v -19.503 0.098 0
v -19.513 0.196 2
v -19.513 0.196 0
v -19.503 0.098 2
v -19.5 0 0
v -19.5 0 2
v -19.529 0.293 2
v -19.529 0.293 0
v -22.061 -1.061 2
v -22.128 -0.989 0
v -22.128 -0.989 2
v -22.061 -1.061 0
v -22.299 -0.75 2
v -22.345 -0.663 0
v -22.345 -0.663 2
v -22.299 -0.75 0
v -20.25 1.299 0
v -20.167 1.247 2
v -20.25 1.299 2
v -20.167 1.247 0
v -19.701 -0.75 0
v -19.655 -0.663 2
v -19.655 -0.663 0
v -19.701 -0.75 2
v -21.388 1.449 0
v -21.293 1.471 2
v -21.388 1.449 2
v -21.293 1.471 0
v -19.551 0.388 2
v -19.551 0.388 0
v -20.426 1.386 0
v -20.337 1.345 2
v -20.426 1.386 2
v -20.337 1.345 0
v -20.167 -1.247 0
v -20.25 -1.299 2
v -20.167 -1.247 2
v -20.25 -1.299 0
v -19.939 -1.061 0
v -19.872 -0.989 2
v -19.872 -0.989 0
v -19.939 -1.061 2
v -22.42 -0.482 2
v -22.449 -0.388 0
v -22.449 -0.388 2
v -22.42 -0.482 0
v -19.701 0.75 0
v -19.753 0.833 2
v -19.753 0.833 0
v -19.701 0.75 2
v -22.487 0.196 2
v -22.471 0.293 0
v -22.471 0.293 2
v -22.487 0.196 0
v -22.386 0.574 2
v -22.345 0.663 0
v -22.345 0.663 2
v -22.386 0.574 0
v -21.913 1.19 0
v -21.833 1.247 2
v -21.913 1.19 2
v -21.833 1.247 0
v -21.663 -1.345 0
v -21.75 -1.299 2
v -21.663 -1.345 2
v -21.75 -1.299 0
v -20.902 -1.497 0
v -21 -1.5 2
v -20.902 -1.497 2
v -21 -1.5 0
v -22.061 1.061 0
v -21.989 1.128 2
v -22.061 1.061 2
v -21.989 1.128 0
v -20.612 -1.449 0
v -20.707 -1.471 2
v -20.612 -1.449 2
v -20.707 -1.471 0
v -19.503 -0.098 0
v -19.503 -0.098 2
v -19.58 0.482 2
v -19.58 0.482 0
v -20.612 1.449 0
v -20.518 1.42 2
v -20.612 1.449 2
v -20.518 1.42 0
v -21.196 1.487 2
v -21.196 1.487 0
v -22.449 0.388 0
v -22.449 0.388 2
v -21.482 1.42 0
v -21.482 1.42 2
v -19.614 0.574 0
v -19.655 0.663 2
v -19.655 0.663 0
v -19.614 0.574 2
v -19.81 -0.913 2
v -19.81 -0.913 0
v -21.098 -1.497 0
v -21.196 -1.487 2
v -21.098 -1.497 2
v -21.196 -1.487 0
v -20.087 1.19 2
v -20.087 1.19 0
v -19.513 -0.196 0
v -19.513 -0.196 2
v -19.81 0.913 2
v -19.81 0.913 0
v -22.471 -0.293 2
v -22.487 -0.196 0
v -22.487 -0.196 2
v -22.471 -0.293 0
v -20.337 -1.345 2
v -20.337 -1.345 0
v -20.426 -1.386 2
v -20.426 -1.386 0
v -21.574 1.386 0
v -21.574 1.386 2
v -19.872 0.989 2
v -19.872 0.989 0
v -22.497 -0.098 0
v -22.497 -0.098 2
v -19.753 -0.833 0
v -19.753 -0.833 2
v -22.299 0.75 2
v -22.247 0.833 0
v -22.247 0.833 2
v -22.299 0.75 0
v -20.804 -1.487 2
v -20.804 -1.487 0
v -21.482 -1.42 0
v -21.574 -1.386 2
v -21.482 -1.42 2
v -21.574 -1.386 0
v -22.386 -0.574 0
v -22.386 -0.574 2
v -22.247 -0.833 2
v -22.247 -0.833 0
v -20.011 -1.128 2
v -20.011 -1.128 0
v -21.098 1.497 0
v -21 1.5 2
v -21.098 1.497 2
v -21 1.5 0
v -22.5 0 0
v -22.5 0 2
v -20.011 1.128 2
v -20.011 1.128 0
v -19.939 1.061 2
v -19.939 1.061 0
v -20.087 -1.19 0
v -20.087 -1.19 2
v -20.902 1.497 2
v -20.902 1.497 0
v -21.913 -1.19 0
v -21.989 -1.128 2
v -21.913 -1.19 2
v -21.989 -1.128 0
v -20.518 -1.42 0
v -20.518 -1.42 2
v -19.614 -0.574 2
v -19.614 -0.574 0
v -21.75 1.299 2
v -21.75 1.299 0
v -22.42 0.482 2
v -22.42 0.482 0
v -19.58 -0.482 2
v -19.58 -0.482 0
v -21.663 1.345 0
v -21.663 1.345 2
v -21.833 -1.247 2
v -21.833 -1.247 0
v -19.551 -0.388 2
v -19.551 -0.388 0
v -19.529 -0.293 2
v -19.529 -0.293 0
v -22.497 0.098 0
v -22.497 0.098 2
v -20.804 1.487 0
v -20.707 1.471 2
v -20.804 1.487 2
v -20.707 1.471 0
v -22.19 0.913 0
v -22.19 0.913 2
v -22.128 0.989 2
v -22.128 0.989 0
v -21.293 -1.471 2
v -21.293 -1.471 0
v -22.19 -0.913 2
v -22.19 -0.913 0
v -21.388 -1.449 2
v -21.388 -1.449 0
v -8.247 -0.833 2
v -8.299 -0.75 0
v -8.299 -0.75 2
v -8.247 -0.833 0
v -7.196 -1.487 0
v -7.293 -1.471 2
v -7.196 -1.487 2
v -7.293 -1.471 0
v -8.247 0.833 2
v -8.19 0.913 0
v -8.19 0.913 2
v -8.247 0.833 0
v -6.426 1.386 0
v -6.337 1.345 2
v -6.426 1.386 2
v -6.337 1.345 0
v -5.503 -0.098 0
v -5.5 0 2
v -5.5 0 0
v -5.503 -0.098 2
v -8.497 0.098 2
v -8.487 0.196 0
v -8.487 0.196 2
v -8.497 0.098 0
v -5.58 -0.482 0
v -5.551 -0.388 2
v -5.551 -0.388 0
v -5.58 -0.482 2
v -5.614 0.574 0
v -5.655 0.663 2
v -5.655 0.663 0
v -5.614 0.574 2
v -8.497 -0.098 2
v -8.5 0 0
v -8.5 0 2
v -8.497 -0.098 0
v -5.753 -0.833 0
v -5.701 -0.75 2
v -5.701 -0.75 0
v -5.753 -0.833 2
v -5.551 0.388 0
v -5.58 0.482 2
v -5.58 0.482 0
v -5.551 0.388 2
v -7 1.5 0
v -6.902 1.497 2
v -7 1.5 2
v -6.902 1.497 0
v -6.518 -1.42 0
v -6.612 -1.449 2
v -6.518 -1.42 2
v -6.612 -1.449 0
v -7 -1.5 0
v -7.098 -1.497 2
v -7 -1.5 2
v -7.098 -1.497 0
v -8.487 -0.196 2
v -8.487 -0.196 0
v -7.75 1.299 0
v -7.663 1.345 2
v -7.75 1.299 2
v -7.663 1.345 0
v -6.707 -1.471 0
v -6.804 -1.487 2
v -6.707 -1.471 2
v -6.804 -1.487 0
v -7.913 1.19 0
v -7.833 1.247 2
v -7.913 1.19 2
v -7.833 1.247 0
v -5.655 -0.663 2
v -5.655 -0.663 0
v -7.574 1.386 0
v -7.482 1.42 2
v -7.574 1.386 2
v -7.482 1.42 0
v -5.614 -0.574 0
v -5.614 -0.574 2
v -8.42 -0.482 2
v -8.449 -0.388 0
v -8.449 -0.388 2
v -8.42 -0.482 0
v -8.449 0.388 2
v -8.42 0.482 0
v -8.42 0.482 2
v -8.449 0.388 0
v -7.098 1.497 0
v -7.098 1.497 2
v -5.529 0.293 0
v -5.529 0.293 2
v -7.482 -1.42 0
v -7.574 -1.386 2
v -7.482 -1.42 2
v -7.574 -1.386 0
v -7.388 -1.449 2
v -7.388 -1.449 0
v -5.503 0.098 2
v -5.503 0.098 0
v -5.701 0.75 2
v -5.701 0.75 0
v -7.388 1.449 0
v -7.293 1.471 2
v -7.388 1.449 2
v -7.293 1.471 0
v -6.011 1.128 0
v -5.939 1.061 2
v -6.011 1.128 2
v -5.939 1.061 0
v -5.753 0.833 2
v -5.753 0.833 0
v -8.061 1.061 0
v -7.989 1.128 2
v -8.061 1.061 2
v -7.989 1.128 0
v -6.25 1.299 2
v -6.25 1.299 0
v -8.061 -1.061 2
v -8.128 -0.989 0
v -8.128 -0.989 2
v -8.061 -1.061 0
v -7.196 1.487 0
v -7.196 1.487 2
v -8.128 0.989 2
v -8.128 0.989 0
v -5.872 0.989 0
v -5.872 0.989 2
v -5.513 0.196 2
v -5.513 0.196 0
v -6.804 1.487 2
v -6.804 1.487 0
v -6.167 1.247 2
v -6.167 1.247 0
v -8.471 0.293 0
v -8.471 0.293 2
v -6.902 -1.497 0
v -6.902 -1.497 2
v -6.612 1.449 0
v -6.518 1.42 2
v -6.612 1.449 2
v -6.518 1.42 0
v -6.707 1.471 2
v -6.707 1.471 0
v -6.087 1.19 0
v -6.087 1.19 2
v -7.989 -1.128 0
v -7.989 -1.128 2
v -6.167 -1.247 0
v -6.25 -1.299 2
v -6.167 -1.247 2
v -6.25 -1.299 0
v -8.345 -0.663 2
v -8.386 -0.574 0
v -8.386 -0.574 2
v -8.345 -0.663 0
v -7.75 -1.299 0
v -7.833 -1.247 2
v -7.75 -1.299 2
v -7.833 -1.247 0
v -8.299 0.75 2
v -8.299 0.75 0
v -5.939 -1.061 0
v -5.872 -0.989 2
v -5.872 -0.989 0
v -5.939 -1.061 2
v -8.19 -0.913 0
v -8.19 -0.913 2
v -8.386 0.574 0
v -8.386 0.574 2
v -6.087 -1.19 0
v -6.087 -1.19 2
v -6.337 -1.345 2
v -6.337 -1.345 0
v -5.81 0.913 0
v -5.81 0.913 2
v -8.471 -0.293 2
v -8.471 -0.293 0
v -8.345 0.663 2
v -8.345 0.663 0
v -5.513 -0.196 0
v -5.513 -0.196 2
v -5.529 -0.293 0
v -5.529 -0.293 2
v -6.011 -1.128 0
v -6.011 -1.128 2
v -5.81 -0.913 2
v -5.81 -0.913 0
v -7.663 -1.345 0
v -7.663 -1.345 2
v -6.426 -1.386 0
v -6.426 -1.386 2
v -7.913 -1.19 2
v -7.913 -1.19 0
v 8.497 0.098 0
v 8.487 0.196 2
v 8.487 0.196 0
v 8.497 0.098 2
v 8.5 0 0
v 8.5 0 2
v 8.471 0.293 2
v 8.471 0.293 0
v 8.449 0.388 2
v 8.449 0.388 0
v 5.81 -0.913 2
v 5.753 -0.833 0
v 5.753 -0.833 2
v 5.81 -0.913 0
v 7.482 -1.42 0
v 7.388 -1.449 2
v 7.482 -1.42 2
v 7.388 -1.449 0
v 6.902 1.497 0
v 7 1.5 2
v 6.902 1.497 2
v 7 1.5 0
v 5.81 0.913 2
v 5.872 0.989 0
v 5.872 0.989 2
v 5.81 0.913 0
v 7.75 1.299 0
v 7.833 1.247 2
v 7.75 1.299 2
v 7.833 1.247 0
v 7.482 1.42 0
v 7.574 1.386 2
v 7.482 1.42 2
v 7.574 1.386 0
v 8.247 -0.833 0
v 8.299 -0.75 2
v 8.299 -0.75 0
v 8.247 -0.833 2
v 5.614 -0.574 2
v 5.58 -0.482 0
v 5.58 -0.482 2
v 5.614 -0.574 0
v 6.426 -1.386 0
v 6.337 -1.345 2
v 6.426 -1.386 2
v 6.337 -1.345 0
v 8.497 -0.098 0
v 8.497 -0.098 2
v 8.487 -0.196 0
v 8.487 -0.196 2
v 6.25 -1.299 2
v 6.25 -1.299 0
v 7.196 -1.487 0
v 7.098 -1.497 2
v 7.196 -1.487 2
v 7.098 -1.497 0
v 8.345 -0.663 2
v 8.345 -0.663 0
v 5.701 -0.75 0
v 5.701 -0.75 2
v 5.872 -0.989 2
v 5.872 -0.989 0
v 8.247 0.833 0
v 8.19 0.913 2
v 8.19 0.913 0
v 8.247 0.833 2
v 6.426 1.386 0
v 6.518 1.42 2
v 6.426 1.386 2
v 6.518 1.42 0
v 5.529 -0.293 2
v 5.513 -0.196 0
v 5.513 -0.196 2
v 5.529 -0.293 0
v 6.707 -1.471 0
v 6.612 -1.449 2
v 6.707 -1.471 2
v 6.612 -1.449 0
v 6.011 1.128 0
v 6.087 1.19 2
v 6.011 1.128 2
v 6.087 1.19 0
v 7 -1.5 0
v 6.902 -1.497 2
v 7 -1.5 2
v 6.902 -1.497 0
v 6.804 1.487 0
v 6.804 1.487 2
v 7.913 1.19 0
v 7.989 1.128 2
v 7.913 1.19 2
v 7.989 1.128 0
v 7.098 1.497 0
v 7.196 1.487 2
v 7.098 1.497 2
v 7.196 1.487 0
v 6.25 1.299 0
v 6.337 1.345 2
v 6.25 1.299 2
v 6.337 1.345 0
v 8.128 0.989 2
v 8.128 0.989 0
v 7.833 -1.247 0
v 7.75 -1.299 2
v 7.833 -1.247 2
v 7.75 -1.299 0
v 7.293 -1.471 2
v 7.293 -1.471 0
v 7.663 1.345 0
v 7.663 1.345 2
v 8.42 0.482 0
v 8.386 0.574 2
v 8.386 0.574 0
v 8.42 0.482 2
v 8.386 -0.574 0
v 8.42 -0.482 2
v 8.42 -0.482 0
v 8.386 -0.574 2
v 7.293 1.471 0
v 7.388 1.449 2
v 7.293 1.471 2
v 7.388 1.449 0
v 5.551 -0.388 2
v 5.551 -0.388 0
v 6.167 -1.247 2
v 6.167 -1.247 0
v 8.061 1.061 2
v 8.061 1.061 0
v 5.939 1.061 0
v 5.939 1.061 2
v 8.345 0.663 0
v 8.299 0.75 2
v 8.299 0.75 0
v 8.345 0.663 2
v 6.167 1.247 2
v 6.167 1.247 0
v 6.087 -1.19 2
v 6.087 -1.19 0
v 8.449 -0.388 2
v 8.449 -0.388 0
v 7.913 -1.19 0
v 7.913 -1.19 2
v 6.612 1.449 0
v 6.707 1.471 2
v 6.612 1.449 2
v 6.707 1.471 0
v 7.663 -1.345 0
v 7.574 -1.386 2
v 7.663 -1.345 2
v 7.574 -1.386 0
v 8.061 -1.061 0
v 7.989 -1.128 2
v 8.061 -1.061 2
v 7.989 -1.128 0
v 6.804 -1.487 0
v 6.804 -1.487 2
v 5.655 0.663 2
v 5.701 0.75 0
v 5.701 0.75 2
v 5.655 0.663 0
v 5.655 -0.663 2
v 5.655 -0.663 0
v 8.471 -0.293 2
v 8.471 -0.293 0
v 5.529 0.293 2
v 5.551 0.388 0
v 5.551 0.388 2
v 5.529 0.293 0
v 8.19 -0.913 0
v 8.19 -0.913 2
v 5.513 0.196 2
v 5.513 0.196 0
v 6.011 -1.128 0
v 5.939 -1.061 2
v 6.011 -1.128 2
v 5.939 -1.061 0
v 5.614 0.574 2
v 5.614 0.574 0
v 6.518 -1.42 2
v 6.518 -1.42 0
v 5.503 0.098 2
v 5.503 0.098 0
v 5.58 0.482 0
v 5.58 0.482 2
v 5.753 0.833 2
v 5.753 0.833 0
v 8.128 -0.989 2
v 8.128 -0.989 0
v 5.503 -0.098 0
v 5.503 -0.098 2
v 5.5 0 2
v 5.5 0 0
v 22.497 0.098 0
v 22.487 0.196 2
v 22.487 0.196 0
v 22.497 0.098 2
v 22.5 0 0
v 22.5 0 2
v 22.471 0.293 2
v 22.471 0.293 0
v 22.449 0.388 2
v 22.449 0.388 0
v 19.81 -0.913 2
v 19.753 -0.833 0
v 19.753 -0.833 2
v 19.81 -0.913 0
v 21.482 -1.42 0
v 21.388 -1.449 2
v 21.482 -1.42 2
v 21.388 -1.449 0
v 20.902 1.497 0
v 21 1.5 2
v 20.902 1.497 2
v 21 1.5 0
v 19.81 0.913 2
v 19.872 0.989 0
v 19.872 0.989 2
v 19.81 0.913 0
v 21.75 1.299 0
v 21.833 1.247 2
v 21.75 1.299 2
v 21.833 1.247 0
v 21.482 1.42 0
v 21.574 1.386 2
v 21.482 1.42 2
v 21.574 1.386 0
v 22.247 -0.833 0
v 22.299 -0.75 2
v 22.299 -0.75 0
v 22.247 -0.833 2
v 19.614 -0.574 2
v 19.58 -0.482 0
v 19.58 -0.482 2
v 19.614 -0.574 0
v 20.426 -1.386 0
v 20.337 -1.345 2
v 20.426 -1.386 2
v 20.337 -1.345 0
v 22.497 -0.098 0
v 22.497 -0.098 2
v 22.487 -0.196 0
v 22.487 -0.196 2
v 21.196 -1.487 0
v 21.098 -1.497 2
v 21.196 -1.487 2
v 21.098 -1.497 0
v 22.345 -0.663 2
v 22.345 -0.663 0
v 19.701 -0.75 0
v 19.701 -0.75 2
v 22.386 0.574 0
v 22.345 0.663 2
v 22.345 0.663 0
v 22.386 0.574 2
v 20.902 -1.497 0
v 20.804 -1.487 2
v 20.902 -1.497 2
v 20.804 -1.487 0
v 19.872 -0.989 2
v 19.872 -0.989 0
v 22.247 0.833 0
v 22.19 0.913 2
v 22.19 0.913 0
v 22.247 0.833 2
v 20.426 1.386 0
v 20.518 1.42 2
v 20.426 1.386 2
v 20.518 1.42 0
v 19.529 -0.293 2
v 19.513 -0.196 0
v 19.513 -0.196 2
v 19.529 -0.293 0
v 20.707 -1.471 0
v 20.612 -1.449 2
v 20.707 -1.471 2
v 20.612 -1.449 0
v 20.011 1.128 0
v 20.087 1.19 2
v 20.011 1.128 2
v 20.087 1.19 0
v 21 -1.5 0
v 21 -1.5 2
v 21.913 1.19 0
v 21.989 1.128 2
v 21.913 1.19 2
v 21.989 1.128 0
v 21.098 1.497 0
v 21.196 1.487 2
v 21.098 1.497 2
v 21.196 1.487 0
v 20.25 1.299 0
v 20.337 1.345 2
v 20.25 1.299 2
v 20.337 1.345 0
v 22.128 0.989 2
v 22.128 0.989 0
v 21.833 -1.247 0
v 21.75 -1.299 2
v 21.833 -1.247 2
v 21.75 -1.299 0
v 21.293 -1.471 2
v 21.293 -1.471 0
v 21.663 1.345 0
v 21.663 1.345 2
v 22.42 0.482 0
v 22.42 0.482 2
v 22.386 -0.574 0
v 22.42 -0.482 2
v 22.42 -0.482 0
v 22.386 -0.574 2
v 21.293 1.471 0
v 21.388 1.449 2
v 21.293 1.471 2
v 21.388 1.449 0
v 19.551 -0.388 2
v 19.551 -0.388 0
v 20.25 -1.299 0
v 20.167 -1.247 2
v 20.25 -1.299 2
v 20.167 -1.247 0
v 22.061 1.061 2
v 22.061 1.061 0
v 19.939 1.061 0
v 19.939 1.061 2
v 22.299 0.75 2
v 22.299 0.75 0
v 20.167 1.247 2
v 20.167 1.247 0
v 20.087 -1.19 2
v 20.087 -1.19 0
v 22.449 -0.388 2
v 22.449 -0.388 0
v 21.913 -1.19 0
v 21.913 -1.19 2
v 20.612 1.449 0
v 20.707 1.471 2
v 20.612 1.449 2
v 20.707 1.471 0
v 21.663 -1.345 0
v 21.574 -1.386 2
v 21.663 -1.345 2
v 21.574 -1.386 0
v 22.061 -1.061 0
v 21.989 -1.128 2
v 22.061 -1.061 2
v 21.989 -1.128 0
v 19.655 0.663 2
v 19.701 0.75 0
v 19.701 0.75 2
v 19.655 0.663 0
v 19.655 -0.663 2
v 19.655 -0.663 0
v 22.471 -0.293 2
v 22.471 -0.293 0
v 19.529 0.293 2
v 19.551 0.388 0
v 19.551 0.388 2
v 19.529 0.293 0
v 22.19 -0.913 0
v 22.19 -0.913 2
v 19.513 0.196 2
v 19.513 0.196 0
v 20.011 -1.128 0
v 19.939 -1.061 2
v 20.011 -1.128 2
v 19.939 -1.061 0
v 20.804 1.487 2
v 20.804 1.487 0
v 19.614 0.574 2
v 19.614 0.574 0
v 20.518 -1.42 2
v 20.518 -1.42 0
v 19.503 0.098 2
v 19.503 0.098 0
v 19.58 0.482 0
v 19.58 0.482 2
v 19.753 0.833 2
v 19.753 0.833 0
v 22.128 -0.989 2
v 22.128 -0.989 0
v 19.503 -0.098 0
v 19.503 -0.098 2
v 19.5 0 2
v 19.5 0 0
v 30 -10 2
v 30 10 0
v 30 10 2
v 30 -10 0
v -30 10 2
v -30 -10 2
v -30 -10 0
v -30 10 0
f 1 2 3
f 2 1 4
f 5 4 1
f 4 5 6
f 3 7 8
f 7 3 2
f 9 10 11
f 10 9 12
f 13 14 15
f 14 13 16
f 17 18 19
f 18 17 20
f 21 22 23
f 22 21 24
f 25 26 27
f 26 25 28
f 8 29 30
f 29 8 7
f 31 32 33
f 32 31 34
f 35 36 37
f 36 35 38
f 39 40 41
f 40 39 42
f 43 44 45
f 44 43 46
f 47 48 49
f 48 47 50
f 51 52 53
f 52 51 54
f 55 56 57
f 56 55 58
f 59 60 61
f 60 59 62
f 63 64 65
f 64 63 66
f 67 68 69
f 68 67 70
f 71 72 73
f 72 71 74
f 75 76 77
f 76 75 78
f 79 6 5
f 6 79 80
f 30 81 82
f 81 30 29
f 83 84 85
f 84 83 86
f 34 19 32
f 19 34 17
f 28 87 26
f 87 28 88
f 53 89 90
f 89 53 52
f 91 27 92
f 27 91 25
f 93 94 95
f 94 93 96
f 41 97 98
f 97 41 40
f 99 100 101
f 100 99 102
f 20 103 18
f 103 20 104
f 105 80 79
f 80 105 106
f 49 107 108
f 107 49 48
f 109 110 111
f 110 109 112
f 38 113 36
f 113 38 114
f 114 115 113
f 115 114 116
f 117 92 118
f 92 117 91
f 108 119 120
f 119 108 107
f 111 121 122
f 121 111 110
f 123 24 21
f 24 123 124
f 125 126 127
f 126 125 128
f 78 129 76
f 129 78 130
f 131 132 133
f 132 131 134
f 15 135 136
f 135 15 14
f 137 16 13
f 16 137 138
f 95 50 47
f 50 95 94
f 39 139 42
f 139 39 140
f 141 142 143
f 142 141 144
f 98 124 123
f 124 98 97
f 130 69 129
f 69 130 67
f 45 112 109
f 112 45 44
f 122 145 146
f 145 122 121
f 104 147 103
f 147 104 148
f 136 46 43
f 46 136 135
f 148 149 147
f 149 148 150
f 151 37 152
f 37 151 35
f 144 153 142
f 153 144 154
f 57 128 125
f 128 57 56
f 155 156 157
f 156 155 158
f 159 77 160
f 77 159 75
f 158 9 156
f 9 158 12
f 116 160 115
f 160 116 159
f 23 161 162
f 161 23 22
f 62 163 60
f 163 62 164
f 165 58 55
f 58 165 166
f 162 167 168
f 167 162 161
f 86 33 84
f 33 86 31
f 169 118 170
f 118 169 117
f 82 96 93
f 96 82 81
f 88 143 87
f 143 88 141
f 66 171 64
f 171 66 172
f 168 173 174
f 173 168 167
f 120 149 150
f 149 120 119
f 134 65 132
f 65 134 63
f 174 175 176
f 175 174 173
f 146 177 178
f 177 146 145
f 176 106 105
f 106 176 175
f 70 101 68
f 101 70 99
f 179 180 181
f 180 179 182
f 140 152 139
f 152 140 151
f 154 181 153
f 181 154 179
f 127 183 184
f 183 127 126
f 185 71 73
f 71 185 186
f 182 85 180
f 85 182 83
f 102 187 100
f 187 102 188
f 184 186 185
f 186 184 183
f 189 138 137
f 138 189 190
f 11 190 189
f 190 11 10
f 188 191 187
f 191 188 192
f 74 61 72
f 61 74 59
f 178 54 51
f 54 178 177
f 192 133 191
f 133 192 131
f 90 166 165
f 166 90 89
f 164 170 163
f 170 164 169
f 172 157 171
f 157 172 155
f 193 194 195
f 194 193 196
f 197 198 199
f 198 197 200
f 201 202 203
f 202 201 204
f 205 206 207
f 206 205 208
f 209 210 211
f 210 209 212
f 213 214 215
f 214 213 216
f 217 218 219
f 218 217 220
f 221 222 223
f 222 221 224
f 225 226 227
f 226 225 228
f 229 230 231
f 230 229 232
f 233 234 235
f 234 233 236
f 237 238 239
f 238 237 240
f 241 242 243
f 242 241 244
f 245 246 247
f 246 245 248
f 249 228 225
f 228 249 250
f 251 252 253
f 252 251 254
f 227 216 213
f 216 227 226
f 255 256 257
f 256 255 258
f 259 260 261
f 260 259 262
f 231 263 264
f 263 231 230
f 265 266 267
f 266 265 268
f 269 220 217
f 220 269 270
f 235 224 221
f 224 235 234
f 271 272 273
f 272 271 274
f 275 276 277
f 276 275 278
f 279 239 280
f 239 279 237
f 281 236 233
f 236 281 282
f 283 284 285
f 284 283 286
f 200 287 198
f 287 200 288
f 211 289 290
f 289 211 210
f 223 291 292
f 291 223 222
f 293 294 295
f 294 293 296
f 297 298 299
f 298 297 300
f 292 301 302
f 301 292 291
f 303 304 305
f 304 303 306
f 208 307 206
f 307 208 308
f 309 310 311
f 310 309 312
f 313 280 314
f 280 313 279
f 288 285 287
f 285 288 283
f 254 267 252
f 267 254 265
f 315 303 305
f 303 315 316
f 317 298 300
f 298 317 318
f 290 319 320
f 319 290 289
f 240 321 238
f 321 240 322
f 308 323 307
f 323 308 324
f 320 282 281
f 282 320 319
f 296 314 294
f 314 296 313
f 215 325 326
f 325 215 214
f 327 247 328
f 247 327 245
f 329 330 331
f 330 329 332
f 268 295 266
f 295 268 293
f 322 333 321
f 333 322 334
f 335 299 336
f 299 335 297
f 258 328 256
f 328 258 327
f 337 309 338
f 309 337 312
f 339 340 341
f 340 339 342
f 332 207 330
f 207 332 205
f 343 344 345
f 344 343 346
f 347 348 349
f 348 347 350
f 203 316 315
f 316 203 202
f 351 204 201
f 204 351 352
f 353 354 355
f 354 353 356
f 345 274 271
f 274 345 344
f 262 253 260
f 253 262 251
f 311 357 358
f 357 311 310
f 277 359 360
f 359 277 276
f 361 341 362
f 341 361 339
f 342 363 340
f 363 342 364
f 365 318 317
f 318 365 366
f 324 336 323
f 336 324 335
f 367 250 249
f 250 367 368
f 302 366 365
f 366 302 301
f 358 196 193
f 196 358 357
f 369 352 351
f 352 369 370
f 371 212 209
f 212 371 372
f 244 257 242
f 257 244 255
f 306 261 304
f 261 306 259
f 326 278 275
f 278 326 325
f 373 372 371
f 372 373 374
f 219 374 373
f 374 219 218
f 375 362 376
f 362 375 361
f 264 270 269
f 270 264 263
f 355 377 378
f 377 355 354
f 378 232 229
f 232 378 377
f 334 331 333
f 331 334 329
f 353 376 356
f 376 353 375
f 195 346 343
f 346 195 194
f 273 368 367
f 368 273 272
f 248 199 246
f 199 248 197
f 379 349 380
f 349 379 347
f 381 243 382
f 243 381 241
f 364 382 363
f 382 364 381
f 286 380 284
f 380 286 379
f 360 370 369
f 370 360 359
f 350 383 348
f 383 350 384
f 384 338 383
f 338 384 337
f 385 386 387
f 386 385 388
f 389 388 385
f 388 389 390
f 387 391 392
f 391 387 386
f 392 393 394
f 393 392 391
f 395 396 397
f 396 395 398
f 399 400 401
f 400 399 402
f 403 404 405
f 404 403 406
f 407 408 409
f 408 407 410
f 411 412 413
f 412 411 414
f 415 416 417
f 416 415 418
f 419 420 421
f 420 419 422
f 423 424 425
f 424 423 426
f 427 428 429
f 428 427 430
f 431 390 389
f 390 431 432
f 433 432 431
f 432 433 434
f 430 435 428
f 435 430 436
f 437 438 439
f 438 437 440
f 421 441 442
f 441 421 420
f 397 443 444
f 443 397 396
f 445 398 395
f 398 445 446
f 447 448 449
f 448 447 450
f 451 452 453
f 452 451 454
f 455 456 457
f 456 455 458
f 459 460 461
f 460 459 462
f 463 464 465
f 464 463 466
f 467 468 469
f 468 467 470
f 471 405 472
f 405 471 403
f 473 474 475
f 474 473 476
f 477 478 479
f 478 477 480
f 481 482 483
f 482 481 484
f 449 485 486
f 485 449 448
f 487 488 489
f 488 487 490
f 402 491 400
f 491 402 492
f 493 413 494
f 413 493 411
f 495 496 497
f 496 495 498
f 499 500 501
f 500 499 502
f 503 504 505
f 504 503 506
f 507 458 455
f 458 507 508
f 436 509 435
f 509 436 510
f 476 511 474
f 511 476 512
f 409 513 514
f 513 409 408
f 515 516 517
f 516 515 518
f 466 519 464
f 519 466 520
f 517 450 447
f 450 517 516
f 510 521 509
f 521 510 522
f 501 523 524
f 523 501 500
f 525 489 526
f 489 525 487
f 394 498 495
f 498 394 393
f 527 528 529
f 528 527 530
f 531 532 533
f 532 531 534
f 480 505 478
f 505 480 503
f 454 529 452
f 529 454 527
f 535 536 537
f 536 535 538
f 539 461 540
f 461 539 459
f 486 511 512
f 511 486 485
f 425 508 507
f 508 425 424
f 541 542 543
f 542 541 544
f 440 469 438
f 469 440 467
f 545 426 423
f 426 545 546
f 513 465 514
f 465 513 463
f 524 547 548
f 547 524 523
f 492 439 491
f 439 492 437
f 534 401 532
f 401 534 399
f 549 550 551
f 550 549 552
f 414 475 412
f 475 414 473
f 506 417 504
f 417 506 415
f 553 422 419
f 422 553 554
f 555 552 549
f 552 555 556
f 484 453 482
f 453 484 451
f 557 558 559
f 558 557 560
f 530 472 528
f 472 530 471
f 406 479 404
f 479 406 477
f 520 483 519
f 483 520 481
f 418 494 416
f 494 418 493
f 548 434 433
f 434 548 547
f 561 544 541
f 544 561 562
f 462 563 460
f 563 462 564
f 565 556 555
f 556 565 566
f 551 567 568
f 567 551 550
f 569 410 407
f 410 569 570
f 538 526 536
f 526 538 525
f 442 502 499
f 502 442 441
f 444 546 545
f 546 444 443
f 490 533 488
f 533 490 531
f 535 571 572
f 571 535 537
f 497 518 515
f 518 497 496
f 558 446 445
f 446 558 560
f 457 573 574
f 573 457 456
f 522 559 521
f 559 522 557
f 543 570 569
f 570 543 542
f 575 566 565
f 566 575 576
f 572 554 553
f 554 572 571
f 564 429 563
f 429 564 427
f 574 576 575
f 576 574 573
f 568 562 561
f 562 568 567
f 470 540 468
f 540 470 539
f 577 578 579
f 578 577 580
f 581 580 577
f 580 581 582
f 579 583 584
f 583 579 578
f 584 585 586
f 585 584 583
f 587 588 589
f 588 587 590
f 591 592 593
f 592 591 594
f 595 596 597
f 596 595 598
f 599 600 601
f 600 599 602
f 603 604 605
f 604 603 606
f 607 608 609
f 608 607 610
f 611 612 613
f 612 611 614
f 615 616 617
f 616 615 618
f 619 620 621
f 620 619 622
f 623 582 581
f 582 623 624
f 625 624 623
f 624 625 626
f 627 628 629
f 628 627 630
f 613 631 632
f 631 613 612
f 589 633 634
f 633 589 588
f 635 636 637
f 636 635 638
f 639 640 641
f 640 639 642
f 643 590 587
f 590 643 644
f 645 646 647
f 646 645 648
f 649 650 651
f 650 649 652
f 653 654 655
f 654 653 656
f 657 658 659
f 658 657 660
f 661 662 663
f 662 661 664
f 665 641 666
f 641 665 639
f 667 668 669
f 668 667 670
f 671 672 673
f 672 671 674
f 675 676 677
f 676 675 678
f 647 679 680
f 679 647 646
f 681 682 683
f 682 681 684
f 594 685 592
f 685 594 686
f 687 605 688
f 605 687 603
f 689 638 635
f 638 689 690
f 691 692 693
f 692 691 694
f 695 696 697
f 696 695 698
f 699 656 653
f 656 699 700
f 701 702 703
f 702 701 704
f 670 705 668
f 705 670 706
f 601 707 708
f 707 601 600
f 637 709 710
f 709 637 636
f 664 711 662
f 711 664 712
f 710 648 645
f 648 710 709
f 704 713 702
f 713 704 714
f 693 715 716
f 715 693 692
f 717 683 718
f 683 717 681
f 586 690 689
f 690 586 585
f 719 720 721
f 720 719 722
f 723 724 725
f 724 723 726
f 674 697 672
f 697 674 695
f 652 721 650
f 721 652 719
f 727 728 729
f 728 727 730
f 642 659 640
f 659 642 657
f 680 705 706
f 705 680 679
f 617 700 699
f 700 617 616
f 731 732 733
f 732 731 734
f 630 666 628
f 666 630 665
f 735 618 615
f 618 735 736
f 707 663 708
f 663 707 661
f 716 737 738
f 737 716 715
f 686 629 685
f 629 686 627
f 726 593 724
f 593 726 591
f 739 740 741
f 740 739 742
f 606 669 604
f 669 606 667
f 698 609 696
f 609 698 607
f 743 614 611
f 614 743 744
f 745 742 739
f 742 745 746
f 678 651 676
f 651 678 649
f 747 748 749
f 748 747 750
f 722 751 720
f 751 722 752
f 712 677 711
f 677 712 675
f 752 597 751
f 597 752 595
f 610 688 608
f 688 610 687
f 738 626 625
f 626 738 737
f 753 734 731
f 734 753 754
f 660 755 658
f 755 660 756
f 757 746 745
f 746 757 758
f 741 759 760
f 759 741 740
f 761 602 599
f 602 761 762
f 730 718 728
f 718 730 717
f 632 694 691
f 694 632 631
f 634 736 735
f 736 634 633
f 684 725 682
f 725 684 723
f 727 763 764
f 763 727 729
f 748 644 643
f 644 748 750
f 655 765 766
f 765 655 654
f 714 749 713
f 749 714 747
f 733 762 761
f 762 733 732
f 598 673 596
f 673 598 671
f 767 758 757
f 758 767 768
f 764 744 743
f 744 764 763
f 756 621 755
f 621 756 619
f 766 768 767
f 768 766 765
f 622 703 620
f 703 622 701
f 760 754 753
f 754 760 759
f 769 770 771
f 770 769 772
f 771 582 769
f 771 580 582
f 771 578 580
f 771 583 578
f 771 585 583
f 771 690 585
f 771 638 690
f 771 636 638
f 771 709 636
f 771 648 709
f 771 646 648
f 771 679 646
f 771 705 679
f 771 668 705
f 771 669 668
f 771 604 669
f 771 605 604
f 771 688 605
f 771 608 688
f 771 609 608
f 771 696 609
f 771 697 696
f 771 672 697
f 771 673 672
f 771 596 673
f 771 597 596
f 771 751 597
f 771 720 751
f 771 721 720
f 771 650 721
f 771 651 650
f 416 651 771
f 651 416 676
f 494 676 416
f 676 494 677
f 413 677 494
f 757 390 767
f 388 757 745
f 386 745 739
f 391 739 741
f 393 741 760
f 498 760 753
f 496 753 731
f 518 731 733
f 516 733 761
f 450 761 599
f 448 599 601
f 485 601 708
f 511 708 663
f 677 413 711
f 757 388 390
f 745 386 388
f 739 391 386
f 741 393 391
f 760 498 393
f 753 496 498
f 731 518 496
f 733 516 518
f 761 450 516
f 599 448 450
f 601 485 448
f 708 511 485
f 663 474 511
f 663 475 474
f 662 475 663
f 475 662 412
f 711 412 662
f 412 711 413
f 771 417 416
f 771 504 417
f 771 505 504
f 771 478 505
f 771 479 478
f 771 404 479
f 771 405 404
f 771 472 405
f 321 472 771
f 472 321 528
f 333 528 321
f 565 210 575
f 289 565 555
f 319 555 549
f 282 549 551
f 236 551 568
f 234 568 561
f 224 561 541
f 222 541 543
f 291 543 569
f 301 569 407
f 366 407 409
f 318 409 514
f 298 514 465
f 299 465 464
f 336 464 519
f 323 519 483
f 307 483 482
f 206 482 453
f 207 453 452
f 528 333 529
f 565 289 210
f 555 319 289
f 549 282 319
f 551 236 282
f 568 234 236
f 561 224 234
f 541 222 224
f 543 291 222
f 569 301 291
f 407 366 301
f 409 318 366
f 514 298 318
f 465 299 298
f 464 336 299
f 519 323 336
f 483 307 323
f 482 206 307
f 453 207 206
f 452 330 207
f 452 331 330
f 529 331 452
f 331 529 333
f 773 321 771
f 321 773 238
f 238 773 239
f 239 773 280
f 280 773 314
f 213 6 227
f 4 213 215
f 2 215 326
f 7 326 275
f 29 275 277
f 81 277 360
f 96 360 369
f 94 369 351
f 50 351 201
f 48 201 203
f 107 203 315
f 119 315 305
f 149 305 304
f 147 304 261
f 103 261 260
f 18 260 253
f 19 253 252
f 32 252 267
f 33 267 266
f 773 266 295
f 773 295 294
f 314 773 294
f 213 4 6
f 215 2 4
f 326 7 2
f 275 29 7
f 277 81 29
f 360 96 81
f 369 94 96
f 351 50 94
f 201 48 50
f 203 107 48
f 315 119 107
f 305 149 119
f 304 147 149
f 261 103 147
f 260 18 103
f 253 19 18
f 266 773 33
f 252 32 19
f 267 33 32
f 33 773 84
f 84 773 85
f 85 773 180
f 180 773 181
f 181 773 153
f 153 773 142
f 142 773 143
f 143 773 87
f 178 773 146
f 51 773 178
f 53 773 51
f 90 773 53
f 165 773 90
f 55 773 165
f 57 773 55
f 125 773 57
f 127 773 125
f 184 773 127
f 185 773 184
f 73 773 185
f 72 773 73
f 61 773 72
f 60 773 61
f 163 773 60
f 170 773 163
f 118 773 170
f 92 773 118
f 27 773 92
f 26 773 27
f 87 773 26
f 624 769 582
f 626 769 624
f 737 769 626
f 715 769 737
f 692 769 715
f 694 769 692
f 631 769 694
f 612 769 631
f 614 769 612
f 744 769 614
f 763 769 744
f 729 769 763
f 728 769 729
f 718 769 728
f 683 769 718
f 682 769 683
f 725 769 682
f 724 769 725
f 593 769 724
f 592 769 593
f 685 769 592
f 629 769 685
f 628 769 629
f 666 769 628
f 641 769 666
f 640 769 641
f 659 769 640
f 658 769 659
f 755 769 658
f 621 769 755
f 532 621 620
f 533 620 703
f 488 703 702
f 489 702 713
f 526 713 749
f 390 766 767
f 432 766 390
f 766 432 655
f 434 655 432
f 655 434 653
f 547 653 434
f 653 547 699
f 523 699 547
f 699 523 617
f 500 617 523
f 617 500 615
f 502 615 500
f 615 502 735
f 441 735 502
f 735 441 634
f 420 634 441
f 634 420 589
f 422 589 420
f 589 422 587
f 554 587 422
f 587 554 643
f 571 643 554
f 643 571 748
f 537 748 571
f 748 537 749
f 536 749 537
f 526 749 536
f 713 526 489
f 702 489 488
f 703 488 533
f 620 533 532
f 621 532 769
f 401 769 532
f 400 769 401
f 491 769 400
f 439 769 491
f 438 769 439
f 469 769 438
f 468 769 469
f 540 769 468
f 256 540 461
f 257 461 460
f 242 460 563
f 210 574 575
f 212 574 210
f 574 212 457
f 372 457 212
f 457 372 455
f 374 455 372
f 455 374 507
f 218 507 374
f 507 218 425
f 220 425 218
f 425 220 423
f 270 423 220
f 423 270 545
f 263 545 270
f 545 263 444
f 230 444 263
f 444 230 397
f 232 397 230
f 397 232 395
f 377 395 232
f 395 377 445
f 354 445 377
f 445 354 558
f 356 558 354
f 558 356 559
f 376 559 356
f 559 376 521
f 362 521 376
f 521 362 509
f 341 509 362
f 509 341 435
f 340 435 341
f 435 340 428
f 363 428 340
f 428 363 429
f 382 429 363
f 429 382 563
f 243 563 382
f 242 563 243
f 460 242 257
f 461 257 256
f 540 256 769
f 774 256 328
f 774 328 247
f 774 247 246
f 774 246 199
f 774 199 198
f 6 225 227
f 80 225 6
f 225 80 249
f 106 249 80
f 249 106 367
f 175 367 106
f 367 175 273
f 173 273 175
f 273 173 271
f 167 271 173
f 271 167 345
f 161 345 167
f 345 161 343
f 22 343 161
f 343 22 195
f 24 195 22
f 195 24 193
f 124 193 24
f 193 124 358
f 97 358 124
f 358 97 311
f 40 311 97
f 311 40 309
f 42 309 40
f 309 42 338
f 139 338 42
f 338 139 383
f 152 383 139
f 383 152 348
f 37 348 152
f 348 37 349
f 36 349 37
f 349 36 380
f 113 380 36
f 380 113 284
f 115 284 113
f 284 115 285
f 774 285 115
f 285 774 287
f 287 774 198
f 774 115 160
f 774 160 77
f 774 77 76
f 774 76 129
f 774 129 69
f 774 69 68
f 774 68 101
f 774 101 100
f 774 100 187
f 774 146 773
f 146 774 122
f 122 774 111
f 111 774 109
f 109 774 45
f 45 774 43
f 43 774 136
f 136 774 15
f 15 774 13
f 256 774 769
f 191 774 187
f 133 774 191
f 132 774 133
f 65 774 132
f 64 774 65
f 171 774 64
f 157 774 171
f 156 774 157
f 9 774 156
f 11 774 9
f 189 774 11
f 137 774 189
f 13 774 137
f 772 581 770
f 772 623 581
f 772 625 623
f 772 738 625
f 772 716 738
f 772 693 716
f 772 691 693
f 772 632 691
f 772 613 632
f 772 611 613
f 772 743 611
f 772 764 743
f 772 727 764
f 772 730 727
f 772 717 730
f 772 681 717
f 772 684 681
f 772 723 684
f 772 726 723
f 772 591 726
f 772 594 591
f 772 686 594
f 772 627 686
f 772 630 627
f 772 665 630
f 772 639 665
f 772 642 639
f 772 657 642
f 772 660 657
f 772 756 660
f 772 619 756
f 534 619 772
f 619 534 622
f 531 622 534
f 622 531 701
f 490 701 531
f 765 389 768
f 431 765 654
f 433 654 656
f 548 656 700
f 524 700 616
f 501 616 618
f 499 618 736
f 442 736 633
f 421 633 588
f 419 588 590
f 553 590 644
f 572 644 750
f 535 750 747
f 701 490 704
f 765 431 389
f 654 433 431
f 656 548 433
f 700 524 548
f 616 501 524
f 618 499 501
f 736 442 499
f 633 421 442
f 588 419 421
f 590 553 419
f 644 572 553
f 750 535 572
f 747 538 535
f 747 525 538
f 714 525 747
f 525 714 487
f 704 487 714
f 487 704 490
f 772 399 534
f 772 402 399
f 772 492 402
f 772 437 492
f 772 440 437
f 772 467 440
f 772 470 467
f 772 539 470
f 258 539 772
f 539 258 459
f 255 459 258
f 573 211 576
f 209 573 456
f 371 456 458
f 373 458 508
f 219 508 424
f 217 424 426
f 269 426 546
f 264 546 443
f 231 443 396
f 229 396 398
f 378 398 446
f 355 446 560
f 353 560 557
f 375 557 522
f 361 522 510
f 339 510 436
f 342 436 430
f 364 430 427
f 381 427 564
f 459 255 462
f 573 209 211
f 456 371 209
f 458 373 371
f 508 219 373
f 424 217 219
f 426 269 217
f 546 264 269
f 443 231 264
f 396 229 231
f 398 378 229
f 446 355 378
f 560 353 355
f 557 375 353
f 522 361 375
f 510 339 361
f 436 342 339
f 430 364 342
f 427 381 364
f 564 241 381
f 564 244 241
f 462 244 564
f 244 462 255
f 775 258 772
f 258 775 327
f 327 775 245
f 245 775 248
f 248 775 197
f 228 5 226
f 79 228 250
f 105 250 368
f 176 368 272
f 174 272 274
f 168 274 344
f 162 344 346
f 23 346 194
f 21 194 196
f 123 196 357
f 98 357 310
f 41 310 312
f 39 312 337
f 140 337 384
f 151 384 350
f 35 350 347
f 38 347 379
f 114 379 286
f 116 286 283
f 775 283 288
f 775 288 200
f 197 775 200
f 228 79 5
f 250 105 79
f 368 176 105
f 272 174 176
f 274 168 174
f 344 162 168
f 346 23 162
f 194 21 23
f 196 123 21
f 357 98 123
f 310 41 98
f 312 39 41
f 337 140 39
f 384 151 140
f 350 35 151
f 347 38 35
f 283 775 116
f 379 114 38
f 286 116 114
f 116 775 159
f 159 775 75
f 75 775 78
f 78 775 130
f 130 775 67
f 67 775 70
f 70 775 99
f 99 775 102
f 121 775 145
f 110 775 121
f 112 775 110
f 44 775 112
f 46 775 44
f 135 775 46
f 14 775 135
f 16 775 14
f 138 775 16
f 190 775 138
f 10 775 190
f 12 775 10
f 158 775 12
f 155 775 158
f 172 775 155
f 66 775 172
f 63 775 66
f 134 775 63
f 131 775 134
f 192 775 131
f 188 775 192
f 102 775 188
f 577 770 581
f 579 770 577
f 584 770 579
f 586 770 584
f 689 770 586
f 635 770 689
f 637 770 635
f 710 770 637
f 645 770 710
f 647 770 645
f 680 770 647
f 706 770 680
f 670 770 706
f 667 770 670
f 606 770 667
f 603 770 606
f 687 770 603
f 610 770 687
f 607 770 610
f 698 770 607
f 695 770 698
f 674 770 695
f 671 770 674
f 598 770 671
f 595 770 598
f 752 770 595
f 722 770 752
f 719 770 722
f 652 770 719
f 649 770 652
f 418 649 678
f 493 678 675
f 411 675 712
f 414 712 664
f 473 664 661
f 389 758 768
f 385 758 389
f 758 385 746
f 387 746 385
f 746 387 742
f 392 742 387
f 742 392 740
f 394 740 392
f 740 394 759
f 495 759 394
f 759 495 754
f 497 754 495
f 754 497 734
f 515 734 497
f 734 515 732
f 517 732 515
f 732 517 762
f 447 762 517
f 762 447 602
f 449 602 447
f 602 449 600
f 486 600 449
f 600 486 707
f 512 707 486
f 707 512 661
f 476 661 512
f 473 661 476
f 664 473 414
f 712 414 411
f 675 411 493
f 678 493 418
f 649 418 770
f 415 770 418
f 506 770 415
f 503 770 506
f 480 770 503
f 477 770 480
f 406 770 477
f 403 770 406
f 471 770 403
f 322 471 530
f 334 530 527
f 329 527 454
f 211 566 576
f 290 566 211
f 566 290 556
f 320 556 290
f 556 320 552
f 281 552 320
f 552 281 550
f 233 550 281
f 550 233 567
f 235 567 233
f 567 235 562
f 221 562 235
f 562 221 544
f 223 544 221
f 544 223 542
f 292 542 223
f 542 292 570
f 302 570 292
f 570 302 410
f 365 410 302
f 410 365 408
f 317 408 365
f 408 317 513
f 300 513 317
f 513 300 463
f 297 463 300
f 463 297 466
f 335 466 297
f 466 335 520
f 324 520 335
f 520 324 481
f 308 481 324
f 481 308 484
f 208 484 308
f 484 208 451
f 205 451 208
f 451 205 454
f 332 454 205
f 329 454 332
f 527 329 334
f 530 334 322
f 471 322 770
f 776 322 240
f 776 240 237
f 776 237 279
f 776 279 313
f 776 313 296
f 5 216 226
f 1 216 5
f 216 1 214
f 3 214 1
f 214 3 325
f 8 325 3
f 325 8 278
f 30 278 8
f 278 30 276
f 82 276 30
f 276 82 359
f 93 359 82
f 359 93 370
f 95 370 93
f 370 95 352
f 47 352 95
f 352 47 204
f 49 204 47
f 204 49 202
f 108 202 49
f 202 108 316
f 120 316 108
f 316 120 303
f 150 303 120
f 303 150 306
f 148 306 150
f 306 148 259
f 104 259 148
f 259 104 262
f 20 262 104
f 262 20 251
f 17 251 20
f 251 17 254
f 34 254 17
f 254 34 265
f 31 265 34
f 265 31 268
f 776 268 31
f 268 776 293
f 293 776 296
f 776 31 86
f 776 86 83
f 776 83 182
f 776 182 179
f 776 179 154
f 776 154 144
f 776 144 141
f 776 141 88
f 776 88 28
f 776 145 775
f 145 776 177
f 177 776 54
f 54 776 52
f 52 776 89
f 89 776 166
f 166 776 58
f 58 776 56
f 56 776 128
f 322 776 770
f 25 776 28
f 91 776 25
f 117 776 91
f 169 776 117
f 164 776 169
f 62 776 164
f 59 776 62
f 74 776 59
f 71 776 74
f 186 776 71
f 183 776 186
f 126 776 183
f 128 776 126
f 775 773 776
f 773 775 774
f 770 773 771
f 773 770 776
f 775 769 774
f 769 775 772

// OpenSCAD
// Auto-generated from tests/data/feature_fixtures_manifest.json
// fixture: plate_wide_linear
// fixture_type: plate
// description: Wide plate with a 4-hole linear pattern along X. High-span pattern on a wide footprint.
$fn = 96;

plate_size = [60.000000, 20.000000, 2.000000];
plate_origin = [-30.000000, -10.000000, 0.000000];

module through_hole(center, diameter, height) {
  translate(center) cylinder(d=diameter, h=height, center=false);
}

module through_slot(start, end, width, height) {
  hull() {
    through_hole(start, width, height);
    through_hole(end, width, height);
  }
}

module counterbore_hole(center, through_d, bore_d, bore_depth, plate_thickness) {
  translate([center[0], center[1], -0.1])
    cylinder(d=through_d, h=plate_thickness + 0.2, center=false);
  translate([center[0], center[1], plate_thickness - bore_depth])
    cylinder(d=bore_d, h=bore_depth + 0.1, center=false);
}

difference() {
  translate(plate_origin) cube(plate_size);
  for (i = [0 : 3]) {
    through_hole([-21.000000, 0.000000, -0.100000] + i * [14.000000, 0.000000, 0.000000], 3.000000, 2.200000);  // linear_pattern_0
  }
}
